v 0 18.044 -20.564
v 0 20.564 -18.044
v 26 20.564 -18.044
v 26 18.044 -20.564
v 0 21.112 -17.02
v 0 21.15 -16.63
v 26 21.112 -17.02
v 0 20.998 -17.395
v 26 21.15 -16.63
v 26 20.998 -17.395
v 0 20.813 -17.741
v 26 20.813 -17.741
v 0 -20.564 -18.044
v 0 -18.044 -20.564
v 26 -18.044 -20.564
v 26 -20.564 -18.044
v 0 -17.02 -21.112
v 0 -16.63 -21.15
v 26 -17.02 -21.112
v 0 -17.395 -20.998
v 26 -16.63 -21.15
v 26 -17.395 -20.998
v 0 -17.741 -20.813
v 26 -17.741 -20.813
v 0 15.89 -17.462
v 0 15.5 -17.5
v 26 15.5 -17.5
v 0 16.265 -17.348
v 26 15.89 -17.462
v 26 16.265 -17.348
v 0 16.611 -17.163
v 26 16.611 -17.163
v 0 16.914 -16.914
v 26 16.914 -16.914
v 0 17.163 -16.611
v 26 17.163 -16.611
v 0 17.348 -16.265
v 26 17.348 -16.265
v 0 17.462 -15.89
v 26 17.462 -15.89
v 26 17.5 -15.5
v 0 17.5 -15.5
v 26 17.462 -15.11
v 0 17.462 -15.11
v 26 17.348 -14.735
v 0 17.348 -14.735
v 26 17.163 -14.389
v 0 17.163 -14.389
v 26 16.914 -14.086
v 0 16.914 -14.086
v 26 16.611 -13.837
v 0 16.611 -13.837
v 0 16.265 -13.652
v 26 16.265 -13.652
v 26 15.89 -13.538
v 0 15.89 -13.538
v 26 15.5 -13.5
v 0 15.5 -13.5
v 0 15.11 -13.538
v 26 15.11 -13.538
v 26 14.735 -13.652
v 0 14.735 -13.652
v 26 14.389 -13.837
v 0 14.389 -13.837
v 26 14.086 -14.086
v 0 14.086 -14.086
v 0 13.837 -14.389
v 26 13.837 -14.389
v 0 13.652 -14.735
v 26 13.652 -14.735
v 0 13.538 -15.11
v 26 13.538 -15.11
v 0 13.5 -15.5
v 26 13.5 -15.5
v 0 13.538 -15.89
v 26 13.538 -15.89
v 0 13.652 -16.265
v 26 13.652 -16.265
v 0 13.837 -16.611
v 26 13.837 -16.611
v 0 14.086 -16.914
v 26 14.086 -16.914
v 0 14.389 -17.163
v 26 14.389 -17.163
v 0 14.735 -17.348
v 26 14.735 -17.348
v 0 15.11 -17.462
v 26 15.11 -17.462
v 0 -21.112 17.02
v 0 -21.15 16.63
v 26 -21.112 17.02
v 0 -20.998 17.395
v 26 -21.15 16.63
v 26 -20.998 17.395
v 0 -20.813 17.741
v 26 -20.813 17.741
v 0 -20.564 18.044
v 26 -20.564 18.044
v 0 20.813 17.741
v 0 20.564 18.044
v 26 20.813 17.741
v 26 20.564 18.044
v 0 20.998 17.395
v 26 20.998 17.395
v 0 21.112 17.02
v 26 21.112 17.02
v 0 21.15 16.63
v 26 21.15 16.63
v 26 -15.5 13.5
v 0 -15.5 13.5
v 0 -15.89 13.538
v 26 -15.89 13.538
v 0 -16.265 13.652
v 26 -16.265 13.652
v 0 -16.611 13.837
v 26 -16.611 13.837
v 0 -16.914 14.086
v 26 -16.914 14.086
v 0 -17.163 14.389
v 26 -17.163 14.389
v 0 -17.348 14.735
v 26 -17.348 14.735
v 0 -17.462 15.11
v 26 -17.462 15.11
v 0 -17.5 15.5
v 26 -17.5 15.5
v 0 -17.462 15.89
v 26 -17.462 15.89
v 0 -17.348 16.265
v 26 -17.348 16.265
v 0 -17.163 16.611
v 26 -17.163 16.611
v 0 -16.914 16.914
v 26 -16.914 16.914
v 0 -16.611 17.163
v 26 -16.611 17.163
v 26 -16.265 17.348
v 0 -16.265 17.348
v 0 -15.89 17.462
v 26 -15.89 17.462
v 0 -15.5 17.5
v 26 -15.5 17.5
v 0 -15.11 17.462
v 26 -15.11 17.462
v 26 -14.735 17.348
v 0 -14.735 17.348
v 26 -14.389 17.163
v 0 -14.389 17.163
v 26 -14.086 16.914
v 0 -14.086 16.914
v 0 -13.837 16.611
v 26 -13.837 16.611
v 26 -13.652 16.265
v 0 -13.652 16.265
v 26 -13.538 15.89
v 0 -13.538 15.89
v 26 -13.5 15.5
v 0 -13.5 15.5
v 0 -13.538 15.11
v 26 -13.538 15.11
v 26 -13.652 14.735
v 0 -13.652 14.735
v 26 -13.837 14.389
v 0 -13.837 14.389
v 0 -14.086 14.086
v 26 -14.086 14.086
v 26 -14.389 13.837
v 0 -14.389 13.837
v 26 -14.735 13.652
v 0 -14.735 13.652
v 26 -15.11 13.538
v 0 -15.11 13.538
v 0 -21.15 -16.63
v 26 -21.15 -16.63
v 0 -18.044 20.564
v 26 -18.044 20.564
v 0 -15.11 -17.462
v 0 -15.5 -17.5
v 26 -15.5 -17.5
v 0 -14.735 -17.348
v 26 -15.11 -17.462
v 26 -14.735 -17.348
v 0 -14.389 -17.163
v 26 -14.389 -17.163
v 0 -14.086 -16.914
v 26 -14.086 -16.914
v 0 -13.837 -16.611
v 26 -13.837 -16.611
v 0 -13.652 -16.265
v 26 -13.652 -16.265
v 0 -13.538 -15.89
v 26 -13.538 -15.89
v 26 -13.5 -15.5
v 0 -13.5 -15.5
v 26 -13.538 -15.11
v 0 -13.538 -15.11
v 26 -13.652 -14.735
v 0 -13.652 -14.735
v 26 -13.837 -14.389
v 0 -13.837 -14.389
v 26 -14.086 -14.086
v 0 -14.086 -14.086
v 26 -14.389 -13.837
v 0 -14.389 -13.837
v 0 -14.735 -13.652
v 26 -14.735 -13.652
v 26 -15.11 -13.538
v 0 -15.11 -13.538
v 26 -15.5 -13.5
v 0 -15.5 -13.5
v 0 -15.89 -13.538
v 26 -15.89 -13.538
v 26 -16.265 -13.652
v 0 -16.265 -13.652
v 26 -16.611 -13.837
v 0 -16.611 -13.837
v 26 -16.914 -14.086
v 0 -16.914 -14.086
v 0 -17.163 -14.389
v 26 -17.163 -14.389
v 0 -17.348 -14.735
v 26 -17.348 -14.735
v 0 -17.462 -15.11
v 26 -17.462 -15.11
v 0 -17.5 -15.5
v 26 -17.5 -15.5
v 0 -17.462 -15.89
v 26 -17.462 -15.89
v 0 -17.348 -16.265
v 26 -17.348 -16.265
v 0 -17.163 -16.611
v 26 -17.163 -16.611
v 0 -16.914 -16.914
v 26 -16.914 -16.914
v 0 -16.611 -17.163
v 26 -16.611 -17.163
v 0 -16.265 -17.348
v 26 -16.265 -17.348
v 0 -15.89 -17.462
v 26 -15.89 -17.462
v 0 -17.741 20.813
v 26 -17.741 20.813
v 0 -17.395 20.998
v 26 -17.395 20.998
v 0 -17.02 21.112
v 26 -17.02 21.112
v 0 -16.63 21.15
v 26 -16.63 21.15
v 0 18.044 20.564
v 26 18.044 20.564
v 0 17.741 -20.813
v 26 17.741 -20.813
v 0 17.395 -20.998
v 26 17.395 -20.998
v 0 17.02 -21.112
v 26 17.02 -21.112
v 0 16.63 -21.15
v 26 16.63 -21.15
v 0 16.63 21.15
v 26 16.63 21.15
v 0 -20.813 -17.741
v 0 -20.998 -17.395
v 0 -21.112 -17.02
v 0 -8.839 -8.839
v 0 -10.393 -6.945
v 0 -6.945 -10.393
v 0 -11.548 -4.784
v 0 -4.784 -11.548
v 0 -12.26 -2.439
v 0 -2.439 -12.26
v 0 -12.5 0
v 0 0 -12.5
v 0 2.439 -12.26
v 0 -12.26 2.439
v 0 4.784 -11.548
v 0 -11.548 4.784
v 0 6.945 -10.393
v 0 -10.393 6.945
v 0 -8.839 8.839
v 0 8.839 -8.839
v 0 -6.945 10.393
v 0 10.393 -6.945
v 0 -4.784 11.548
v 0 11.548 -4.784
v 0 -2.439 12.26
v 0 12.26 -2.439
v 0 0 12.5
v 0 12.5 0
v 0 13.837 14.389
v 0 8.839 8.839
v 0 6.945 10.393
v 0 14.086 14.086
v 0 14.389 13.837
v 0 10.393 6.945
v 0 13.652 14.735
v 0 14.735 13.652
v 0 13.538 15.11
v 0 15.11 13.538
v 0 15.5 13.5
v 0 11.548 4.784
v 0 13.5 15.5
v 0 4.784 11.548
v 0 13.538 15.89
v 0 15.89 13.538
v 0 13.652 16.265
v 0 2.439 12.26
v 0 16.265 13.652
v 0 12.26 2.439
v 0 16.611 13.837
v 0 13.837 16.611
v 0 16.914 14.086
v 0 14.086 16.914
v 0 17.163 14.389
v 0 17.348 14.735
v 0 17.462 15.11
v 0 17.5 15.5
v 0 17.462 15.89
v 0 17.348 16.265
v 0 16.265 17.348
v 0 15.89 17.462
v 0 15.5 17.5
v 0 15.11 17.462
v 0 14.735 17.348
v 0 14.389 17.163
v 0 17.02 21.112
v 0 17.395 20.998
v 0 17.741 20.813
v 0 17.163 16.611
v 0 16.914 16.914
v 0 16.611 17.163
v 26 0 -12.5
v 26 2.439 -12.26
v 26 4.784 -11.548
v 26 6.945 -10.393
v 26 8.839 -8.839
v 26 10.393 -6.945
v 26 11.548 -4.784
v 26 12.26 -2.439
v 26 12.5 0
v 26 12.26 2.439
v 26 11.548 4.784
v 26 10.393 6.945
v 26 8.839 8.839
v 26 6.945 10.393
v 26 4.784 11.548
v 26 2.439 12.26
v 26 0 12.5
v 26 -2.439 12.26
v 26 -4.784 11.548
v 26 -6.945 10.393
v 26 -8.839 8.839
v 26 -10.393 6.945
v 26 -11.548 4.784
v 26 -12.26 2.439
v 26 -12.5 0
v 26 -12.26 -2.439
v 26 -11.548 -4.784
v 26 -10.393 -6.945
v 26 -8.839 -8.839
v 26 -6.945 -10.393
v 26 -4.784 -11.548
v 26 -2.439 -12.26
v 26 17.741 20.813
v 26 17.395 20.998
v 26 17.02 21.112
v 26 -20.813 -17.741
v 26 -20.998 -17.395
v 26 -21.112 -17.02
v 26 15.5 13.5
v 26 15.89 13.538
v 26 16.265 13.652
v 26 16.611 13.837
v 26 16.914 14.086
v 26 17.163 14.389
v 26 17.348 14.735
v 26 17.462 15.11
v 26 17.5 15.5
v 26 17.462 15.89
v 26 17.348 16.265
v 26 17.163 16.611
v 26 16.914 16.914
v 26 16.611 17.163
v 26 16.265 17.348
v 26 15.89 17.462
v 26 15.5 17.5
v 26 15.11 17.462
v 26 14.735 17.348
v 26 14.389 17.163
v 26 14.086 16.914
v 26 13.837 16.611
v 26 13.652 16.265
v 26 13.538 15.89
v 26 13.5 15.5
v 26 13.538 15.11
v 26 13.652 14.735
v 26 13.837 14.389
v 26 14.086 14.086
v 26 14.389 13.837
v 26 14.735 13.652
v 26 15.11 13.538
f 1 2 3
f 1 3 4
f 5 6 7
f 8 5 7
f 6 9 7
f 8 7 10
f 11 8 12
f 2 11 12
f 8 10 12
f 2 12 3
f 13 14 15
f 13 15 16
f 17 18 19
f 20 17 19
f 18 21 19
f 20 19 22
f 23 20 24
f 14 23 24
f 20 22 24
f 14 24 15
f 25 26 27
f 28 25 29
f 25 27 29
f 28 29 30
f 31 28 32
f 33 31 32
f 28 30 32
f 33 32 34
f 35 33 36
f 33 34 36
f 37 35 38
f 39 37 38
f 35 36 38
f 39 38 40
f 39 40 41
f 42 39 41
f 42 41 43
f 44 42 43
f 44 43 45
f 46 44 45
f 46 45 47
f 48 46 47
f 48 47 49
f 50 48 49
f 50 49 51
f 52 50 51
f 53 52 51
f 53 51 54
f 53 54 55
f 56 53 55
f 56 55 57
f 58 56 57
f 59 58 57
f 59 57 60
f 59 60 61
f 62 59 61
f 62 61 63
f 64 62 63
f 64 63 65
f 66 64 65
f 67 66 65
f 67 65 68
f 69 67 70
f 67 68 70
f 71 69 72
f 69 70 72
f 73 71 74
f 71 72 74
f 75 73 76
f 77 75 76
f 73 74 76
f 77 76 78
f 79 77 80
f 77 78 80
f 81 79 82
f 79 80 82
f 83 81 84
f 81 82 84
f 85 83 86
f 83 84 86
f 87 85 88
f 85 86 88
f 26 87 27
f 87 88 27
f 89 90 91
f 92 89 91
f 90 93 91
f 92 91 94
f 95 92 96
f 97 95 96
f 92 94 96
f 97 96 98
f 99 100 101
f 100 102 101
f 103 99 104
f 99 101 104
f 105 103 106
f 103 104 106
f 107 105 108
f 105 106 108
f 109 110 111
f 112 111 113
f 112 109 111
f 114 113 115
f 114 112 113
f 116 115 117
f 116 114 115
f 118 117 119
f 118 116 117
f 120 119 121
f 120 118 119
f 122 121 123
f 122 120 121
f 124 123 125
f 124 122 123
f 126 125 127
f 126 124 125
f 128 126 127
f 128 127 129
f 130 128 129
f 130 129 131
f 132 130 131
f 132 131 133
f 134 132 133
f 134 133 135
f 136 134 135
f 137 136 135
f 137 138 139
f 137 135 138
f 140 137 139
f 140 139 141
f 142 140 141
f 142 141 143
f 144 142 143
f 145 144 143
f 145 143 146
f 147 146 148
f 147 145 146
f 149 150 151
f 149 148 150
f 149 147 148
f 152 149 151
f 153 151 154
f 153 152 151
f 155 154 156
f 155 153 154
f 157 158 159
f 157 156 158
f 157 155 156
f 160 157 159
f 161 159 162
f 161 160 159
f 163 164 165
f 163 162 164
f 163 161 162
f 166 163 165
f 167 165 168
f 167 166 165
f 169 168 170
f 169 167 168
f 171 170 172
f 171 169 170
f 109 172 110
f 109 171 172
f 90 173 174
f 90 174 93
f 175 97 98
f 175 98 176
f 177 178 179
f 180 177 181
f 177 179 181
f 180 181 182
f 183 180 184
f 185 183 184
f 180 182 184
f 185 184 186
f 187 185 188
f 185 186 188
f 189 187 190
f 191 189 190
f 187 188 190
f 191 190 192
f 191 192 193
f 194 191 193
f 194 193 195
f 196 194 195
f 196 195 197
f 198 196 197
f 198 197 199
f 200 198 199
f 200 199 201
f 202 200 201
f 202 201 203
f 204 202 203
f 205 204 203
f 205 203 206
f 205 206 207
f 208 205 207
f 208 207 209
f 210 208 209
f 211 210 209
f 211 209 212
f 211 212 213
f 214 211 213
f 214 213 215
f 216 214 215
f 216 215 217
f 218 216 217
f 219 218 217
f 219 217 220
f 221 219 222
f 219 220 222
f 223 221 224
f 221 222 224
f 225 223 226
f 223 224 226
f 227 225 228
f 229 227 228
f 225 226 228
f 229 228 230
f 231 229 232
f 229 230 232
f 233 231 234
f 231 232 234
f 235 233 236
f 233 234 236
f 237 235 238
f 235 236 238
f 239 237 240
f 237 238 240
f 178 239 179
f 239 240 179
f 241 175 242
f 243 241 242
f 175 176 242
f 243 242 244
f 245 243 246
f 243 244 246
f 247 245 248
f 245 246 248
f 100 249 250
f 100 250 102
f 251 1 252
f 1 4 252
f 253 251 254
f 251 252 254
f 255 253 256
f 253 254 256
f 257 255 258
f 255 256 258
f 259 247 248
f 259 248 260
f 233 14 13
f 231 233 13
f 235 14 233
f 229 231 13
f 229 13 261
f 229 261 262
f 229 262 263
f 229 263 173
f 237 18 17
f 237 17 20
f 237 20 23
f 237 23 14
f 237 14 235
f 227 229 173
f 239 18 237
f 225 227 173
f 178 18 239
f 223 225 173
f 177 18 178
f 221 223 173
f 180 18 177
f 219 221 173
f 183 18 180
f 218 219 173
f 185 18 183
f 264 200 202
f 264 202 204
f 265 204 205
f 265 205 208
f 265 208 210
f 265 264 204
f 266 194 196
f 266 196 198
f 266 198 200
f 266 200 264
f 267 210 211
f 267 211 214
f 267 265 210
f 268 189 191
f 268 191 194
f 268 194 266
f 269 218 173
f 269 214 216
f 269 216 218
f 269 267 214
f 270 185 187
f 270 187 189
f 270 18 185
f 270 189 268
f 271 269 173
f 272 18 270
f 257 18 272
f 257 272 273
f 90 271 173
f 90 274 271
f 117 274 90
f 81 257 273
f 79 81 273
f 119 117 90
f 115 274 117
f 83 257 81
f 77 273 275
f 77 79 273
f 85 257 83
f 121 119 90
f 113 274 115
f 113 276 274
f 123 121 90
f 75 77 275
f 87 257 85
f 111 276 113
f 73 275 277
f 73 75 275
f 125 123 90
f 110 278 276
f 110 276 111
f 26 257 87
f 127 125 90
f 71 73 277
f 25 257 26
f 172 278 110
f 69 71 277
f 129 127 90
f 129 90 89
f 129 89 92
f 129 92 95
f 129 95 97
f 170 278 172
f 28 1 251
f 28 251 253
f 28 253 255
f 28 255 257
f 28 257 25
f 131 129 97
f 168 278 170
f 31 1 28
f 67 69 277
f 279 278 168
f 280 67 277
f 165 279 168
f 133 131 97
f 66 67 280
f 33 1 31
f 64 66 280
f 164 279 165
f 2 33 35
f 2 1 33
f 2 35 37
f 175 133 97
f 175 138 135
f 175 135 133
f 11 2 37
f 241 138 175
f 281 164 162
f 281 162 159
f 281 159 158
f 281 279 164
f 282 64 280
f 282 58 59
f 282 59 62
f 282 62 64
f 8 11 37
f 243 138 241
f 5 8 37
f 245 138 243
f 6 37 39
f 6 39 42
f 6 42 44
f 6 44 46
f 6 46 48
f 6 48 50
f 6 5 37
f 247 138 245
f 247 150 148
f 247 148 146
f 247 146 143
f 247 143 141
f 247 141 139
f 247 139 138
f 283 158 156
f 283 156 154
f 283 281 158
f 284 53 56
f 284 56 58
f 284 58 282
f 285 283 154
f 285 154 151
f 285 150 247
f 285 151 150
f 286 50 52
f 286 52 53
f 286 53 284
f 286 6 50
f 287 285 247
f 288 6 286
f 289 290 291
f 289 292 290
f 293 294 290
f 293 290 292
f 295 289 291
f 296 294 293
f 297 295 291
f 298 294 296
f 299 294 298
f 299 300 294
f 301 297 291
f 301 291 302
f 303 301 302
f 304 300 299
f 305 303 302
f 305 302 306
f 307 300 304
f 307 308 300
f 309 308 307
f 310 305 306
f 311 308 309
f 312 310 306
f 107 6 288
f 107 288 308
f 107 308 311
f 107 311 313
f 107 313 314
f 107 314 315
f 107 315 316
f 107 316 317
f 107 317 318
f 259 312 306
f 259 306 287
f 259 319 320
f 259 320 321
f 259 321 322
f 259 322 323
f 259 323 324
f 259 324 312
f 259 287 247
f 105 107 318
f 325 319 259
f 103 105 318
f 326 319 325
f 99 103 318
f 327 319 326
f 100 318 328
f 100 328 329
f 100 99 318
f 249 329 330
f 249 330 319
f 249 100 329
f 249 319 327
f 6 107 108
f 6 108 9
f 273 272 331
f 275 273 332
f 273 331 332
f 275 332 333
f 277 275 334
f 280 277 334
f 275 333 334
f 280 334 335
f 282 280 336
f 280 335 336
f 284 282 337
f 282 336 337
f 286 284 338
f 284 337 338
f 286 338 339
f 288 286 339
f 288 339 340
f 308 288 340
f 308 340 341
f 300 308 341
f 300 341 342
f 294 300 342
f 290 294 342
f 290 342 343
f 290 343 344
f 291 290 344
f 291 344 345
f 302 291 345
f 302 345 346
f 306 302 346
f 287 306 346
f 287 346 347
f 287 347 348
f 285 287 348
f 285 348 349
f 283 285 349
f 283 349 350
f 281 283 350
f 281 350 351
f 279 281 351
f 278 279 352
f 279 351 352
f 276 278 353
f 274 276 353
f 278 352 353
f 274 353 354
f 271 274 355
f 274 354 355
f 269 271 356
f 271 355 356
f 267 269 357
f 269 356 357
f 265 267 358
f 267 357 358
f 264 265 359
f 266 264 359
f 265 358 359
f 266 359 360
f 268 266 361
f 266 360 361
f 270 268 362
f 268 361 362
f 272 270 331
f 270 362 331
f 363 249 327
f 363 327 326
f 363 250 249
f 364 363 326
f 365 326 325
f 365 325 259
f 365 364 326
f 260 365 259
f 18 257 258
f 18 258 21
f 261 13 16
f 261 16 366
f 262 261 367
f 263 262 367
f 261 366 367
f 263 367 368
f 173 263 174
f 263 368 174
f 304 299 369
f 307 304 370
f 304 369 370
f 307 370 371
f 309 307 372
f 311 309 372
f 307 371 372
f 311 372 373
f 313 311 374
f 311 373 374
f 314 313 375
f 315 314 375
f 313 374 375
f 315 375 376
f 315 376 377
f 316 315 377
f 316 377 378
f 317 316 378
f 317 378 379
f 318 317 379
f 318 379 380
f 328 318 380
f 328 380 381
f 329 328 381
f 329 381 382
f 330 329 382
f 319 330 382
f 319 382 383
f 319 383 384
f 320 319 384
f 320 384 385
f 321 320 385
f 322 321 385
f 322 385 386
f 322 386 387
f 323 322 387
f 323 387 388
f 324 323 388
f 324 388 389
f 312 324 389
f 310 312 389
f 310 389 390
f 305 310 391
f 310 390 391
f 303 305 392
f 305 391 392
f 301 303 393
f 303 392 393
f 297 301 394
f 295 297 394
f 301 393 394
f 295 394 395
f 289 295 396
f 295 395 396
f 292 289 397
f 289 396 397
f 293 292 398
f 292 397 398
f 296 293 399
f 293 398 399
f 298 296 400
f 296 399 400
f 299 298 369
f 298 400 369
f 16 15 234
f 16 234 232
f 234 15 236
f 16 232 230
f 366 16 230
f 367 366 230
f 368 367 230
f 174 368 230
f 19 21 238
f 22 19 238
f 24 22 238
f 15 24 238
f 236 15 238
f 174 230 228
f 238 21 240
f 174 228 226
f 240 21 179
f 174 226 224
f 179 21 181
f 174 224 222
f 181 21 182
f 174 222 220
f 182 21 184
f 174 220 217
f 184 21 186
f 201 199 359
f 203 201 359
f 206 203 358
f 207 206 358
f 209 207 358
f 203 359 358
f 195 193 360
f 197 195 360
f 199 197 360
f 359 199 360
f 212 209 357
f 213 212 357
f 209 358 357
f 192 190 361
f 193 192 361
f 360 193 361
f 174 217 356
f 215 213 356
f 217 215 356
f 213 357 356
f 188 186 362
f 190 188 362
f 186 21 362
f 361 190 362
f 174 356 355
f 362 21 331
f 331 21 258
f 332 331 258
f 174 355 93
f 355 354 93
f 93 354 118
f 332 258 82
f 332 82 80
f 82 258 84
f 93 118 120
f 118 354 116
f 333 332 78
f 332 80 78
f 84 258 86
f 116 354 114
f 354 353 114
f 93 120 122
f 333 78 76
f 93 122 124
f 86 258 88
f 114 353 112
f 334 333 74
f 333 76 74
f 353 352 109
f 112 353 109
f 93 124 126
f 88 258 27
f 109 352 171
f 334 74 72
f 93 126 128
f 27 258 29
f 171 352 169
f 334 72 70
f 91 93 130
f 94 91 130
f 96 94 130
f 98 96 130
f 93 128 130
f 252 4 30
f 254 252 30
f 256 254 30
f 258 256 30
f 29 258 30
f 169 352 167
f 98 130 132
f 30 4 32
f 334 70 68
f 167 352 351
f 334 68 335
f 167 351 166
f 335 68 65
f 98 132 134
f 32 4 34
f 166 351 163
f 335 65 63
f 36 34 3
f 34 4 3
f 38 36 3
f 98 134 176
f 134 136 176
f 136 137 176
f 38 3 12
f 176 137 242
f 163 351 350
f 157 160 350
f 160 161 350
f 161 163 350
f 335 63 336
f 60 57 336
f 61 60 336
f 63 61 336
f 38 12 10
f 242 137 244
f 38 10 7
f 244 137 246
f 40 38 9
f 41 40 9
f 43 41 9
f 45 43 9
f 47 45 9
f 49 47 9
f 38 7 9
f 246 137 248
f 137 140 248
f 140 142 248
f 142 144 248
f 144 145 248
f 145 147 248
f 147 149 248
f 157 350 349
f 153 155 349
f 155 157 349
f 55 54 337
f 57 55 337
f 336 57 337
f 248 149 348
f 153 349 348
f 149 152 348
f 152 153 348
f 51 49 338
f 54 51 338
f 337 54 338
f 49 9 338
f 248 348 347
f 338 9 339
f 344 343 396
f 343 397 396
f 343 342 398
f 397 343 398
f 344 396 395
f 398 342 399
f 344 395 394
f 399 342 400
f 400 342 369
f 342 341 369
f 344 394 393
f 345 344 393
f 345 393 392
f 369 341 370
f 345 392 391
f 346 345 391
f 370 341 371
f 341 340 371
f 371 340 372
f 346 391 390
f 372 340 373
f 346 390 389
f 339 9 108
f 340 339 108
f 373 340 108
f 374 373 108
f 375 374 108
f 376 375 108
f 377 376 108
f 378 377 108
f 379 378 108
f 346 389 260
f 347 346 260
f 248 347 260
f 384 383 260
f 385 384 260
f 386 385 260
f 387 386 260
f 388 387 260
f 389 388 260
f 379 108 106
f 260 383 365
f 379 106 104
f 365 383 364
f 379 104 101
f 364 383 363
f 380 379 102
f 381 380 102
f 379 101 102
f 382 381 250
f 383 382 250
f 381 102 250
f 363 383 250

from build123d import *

# Parameters (mm, degrees)
BOSS_EXTRUDE1_DEPTH     = 26
FILLET1_R               = 2
SKETCH2_R               = 12.5
CUT_EXTRUDE1_DEPTH      = 27
SKETCH3_R               = 2
CUT_EXTRUDE2_DEPTH      = 27
LPATTERN1_COUNT         = 2
LPATTERN1_PITCH         = 31
MIRROR1_COPY_1_SKETCH_R = 2
MIRROR1_COPY_1_DEPTH    = 27


with BuildPart() as part:
    # Sketch1 → Boss-Extrude1 (new body)
    with BuildSketch(Plane(origin=(0, 0, 0), x_dir=(0, 0, -1), z_dir=(1, 0, 0))):
        Polygon((-21.15, 17.458030253), (-17.458030253, 21.15), (17.458030253, 21.15), (21.15, 17.458030253), (21.15, -17.458030253), (17.458030253, -21.15), (-17.458030253, -21.15), (-21.15, -17.458030253), align=None)
    extrude(amount=BOSS_EXTRUDE1_DEPTH)

    # Fillet1
    fillet1_edges = [part.edges().sort_by_distance(p)[0] for p in [
        (13, 17.458030253, 21.15),
        (13, 21.15, 17.458030253),
        (13, 21.15, -17.458030253),
        (13, 17.458030253, -21.15),
        (13, -17.458030253, -21.15),
        (13, -21.15, -17.458030253),
        (13, -21.15, 17.458030253),
        (13, -17.458030253, 21.15),
    ]]
    fillet(fillet1_edges, radius=FILLET1_R)

    # Sketch2 → Cut-Extrude1 (cut, through all)
    with BuildSketch(Plane(origin=(26, 0, 0), x_dir=(0, 0, -1), z_dir=(1, 0, 0))):
        Circle(SKETCH2_R)
    extrude(amount=-CUT_EXTRUDE1_DEPTH, mode=Mode.SUBTRACT)

    # Sketch3 → Cut-Extrude2 (cut, through all)
    with BuildSketch(Plane(origin=(26, 0, 0), x_dir=(0, 0, -1), z_dir=(1, 0, 0))):
        with Locations((-15.5, 15.5)):
            Circle(SKETCH3_R)
    cut_extrude2 = extrude(amount=-CUT_EXTRUDE2_DEPTH, mode=Mode.SUBTRACT)

    # LPattern1: Cut-Extrude2 ×2
    with Locations(*[(0, 0, -i * LPATTERN1_PITCH) for i in range(1, LPATTERN1_COUNT)]):
        add(cut_extrude2, mode=Mode.SUBTRACT)

    # Mirror1: Cut-Extrude2 across plane
    add(cut_extrude2.mirror(Plane.ZX), mode=Mode.SUBTRACT)

    # Mirror1 copy 1 sketch → Mirror1 copy 1 (cut, through all)
    with BuildSketch(Plane(origin=(26, 0, -31), x_dir=(0, 0, -1), z_dir=(1, 0, 0))):
        with Locations((-15.5, -15.5)):
            Circle(MIRROR1_COPY_1_SKETCH_R)
    extrude(amount=-MIRROR1_COPY_1_DEPTH, mode=Mode.SUBTRACT)


solid = part.part
